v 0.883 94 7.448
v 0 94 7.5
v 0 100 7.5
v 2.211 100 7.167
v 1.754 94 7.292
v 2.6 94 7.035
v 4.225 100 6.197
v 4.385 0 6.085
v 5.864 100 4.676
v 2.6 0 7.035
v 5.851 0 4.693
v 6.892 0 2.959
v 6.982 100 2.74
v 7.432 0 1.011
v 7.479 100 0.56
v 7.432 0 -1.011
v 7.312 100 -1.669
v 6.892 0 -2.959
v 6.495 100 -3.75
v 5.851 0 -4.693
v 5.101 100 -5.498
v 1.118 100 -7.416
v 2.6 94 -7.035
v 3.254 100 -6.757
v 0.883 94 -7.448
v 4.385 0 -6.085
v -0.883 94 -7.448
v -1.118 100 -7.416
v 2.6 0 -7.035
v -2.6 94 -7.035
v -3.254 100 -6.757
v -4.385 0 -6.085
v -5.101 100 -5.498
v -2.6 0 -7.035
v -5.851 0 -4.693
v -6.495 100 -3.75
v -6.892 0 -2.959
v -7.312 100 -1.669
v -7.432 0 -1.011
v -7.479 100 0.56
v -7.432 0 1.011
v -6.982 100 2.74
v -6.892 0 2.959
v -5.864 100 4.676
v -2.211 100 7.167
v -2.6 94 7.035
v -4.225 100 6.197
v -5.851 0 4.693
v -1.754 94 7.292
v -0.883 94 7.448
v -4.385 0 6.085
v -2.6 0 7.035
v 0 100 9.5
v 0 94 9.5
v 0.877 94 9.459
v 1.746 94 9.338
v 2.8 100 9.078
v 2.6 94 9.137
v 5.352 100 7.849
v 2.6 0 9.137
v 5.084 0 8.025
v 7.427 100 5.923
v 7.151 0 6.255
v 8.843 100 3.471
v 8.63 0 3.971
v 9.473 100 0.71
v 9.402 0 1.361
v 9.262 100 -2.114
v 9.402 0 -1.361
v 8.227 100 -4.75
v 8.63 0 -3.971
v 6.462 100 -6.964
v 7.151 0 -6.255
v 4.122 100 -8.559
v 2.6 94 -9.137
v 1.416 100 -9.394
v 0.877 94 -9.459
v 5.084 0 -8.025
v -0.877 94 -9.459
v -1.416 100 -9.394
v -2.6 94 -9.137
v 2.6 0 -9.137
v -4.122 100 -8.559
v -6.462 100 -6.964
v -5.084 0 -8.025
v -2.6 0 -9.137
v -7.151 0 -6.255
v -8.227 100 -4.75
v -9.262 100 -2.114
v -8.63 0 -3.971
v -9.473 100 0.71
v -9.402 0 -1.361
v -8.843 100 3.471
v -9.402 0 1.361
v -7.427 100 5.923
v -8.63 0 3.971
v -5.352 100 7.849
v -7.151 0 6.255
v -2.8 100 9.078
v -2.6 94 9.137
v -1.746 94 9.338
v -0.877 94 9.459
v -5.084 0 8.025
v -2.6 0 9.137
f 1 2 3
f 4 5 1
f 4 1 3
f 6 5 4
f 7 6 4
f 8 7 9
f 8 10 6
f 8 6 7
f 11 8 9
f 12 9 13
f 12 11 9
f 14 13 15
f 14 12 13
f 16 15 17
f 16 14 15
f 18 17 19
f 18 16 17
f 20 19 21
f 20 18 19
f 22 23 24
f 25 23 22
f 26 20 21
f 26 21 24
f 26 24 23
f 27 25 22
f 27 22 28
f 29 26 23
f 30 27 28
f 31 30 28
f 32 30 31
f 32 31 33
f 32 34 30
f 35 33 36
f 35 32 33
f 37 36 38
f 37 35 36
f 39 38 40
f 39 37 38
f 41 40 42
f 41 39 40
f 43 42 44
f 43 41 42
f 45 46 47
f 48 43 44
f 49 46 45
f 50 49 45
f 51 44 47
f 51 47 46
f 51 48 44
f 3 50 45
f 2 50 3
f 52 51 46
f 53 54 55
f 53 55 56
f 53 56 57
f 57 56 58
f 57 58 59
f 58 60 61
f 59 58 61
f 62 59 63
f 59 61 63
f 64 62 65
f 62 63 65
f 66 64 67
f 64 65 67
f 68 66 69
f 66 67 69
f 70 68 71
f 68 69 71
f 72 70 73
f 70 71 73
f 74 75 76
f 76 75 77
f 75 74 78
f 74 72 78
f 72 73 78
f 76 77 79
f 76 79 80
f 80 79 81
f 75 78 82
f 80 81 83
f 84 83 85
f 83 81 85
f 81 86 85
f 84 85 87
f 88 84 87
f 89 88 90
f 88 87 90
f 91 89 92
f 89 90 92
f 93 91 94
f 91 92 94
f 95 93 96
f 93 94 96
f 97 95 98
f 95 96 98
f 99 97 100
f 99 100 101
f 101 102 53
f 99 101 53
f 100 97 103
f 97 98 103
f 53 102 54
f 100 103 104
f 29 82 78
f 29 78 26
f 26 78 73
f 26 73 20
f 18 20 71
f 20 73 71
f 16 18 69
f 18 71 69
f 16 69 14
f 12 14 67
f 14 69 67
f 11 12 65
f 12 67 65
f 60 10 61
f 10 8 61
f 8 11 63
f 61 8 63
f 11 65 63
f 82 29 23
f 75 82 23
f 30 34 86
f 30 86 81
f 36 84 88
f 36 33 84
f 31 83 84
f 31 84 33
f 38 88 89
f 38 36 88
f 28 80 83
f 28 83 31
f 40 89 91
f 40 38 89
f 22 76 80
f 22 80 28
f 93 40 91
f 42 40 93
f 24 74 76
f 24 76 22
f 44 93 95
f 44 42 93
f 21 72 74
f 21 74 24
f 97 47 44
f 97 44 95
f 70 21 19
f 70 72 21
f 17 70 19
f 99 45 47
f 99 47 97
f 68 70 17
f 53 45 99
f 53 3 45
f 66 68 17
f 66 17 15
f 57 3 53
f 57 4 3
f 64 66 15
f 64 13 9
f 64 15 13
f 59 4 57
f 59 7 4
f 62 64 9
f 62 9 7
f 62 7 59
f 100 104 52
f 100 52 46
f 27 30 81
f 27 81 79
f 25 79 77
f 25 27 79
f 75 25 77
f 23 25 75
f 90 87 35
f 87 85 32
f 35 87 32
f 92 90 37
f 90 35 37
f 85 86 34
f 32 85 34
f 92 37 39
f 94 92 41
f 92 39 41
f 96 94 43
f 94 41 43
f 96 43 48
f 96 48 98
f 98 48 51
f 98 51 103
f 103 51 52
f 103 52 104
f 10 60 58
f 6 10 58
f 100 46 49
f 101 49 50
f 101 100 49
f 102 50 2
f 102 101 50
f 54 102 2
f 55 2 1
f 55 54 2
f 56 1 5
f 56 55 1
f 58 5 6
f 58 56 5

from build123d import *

# Parameters (mm, degrees)
SKETCH1_R           = 9.5
SKETCH1_R_2         = 7.5
BOSS_EXTRUDE1_DEPTH = 100
SKETCH2_W           = 5.2
SKETCH2_H           = 94
CUT_EXTRUDE1_DEPTH  = 100


with BuildPart() as part:
    # Sketch1 → Boss-Extrude1 (new body)
    with BuildSketch(Plane(origin=(0, 0, 0), x_dir=(1, 0, 0), z_dir=(0, 1, 0))):
        with Locations(Location((0, 0, 0), (0, 0, 270))):
            Circle(SKETCH1_R)
        with Locations(Location((0, 0, 0), (0, 0, 270))):
            Circle(SKETCH1_R_2, mode=Mode.SUBTRACT)
    extrude(amount=BOSS_EXTRUDE1_DEPTH)

    # Sketch2 → Cut-Extrude1 (cut)
    with BuildSketch(Plane.XY.offset(20)):
        with Locations((0, 47)):
            Rectangle(SKETCH2_W, SKETCH2_H)
    extrude(amount=-CUT_EXTRUDE1_DEPTH, mode=Mode.SUBTRACT)


solid = part.part
